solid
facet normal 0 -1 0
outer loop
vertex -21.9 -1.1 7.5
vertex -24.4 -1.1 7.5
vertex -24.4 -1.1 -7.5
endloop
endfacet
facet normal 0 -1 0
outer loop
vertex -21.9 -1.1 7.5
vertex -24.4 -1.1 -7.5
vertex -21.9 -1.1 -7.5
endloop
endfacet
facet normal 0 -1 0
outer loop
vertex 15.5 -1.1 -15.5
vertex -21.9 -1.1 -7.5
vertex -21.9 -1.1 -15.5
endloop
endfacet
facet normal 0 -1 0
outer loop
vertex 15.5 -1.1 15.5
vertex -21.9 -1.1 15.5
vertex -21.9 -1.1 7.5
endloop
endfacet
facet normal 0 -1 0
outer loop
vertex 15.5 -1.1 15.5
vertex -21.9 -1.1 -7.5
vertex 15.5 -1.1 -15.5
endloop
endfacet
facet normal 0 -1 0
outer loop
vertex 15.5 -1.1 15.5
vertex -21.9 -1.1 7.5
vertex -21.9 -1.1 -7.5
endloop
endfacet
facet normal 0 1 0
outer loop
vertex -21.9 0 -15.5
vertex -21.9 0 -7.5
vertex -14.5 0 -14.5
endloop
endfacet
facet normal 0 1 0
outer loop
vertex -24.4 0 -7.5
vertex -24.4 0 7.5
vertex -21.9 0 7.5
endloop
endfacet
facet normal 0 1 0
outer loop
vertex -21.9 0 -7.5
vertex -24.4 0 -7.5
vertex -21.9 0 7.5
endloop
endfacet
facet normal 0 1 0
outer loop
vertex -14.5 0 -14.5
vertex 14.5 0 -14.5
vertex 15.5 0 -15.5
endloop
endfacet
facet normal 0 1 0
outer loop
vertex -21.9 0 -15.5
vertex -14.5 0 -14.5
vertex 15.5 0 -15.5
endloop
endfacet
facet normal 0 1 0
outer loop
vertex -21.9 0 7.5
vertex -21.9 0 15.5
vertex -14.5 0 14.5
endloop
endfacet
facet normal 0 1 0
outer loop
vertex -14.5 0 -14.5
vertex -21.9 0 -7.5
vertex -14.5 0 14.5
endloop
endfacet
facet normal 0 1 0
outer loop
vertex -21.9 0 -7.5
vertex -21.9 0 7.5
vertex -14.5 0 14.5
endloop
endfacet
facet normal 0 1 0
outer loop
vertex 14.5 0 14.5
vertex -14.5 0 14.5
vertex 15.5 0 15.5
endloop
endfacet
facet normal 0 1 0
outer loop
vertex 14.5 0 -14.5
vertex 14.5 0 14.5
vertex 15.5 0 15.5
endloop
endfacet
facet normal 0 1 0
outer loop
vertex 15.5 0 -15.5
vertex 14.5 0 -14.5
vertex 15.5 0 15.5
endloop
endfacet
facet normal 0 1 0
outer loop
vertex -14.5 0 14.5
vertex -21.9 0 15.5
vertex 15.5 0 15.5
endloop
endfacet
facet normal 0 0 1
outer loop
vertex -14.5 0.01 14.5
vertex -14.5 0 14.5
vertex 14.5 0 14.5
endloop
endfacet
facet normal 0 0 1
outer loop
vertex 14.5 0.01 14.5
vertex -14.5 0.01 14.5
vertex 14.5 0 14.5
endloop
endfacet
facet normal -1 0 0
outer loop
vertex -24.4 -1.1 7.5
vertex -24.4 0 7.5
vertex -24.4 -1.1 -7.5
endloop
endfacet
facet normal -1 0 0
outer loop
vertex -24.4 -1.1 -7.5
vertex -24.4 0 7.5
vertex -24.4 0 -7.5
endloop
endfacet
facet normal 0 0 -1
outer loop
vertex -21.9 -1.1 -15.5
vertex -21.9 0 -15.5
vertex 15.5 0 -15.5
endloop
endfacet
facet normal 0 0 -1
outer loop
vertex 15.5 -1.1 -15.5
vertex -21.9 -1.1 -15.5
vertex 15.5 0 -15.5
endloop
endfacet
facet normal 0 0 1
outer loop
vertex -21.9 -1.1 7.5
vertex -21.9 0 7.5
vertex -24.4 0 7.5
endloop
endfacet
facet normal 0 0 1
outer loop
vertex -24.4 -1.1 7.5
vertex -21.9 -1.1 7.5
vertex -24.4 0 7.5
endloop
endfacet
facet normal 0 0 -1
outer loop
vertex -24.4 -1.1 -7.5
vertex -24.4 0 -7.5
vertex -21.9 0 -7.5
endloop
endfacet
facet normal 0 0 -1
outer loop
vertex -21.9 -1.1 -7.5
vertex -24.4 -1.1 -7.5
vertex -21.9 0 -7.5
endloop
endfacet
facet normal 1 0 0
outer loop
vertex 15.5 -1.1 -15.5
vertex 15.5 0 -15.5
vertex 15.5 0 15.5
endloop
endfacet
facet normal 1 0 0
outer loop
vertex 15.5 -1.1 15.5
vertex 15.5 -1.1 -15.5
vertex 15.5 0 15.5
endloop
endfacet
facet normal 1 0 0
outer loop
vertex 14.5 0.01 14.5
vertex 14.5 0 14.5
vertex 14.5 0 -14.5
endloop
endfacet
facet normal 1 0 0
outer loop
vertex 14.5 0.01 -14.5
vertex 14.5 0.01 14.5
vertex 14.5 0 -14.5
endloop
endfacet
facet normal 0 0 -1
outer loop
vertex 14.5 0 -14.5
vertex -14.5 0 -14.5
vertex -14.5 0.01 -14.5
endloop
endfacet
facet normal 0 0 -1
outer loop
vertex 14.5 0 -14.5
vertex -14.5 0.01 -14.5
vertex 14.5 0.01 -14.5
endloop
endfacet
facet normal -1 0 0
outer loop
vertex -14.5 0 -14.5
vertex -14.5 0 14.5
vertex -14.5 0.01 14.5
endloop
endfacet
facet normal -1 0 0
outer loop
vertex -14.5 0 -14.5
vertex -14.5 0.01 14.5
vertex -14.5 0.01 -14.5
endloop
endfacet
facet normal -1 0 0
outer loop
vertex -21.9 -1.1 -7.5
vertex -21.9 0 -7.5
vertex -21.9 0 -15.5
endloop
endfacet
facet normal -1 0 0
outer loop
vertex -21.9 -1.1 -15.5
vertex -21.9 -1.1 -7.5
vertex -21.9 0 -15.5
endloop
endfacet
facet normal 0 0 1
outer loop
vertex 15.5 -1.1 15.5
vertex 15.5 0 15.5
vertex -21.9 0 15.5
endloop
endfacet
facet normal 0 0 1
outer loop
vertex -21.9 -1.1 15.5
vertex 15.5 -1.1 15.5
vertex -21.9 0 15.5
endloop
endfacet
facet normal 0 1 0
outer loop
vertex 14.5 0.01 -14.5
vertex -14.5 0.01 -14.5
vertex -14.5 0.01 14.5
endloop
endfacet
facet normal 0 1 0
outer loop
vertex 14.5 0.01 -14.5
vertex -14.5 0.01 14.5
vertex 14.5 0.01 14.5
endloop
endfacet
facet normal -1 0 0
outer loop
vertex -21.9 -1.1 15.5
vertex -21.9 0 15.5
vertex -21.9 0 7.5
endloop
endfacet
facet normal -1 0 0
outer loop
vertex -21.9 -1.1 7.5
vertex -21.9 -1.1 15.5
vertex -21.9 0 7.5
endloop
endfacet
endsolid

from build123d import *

# Parameters (mm, degrees)
SKETCH1_W           = 29
SKETCH1_H           = 29
BOSS_EXTRUDE1_DEPTH = 0.01
BOSS_EXTRUDE2_DEPTH = 1.1


with BuildPart() as part:
    # Sketch1 → Boss-Extrude1 (new body)
    with BuildSketch(Plane(origin=(0, 0, 0), x_dir=(1, 0, 0), z_dir=(0, 1, 0))):
        Rectangle(SKETCH1_W, SKETCH1_H)
    extrude(amount=BOSS_EXTRUDE1_DEPTH)

    # Sketch2 → Boss-Extrude2 (add)
    with BuildSketch(Plane.XZ):
        Polygon((-21.9, 15.5), (-21.9, 7.5), (-24.4, 7.5), (-24.4, -7.5), (-21.9, -7.5), (-21.9, -15.5), (15.5, -15.5), (15.5, 15.5), align=None)
    extrude(amount=BOSS_EXTRUDE2_DEPTH)


solid = part.part
